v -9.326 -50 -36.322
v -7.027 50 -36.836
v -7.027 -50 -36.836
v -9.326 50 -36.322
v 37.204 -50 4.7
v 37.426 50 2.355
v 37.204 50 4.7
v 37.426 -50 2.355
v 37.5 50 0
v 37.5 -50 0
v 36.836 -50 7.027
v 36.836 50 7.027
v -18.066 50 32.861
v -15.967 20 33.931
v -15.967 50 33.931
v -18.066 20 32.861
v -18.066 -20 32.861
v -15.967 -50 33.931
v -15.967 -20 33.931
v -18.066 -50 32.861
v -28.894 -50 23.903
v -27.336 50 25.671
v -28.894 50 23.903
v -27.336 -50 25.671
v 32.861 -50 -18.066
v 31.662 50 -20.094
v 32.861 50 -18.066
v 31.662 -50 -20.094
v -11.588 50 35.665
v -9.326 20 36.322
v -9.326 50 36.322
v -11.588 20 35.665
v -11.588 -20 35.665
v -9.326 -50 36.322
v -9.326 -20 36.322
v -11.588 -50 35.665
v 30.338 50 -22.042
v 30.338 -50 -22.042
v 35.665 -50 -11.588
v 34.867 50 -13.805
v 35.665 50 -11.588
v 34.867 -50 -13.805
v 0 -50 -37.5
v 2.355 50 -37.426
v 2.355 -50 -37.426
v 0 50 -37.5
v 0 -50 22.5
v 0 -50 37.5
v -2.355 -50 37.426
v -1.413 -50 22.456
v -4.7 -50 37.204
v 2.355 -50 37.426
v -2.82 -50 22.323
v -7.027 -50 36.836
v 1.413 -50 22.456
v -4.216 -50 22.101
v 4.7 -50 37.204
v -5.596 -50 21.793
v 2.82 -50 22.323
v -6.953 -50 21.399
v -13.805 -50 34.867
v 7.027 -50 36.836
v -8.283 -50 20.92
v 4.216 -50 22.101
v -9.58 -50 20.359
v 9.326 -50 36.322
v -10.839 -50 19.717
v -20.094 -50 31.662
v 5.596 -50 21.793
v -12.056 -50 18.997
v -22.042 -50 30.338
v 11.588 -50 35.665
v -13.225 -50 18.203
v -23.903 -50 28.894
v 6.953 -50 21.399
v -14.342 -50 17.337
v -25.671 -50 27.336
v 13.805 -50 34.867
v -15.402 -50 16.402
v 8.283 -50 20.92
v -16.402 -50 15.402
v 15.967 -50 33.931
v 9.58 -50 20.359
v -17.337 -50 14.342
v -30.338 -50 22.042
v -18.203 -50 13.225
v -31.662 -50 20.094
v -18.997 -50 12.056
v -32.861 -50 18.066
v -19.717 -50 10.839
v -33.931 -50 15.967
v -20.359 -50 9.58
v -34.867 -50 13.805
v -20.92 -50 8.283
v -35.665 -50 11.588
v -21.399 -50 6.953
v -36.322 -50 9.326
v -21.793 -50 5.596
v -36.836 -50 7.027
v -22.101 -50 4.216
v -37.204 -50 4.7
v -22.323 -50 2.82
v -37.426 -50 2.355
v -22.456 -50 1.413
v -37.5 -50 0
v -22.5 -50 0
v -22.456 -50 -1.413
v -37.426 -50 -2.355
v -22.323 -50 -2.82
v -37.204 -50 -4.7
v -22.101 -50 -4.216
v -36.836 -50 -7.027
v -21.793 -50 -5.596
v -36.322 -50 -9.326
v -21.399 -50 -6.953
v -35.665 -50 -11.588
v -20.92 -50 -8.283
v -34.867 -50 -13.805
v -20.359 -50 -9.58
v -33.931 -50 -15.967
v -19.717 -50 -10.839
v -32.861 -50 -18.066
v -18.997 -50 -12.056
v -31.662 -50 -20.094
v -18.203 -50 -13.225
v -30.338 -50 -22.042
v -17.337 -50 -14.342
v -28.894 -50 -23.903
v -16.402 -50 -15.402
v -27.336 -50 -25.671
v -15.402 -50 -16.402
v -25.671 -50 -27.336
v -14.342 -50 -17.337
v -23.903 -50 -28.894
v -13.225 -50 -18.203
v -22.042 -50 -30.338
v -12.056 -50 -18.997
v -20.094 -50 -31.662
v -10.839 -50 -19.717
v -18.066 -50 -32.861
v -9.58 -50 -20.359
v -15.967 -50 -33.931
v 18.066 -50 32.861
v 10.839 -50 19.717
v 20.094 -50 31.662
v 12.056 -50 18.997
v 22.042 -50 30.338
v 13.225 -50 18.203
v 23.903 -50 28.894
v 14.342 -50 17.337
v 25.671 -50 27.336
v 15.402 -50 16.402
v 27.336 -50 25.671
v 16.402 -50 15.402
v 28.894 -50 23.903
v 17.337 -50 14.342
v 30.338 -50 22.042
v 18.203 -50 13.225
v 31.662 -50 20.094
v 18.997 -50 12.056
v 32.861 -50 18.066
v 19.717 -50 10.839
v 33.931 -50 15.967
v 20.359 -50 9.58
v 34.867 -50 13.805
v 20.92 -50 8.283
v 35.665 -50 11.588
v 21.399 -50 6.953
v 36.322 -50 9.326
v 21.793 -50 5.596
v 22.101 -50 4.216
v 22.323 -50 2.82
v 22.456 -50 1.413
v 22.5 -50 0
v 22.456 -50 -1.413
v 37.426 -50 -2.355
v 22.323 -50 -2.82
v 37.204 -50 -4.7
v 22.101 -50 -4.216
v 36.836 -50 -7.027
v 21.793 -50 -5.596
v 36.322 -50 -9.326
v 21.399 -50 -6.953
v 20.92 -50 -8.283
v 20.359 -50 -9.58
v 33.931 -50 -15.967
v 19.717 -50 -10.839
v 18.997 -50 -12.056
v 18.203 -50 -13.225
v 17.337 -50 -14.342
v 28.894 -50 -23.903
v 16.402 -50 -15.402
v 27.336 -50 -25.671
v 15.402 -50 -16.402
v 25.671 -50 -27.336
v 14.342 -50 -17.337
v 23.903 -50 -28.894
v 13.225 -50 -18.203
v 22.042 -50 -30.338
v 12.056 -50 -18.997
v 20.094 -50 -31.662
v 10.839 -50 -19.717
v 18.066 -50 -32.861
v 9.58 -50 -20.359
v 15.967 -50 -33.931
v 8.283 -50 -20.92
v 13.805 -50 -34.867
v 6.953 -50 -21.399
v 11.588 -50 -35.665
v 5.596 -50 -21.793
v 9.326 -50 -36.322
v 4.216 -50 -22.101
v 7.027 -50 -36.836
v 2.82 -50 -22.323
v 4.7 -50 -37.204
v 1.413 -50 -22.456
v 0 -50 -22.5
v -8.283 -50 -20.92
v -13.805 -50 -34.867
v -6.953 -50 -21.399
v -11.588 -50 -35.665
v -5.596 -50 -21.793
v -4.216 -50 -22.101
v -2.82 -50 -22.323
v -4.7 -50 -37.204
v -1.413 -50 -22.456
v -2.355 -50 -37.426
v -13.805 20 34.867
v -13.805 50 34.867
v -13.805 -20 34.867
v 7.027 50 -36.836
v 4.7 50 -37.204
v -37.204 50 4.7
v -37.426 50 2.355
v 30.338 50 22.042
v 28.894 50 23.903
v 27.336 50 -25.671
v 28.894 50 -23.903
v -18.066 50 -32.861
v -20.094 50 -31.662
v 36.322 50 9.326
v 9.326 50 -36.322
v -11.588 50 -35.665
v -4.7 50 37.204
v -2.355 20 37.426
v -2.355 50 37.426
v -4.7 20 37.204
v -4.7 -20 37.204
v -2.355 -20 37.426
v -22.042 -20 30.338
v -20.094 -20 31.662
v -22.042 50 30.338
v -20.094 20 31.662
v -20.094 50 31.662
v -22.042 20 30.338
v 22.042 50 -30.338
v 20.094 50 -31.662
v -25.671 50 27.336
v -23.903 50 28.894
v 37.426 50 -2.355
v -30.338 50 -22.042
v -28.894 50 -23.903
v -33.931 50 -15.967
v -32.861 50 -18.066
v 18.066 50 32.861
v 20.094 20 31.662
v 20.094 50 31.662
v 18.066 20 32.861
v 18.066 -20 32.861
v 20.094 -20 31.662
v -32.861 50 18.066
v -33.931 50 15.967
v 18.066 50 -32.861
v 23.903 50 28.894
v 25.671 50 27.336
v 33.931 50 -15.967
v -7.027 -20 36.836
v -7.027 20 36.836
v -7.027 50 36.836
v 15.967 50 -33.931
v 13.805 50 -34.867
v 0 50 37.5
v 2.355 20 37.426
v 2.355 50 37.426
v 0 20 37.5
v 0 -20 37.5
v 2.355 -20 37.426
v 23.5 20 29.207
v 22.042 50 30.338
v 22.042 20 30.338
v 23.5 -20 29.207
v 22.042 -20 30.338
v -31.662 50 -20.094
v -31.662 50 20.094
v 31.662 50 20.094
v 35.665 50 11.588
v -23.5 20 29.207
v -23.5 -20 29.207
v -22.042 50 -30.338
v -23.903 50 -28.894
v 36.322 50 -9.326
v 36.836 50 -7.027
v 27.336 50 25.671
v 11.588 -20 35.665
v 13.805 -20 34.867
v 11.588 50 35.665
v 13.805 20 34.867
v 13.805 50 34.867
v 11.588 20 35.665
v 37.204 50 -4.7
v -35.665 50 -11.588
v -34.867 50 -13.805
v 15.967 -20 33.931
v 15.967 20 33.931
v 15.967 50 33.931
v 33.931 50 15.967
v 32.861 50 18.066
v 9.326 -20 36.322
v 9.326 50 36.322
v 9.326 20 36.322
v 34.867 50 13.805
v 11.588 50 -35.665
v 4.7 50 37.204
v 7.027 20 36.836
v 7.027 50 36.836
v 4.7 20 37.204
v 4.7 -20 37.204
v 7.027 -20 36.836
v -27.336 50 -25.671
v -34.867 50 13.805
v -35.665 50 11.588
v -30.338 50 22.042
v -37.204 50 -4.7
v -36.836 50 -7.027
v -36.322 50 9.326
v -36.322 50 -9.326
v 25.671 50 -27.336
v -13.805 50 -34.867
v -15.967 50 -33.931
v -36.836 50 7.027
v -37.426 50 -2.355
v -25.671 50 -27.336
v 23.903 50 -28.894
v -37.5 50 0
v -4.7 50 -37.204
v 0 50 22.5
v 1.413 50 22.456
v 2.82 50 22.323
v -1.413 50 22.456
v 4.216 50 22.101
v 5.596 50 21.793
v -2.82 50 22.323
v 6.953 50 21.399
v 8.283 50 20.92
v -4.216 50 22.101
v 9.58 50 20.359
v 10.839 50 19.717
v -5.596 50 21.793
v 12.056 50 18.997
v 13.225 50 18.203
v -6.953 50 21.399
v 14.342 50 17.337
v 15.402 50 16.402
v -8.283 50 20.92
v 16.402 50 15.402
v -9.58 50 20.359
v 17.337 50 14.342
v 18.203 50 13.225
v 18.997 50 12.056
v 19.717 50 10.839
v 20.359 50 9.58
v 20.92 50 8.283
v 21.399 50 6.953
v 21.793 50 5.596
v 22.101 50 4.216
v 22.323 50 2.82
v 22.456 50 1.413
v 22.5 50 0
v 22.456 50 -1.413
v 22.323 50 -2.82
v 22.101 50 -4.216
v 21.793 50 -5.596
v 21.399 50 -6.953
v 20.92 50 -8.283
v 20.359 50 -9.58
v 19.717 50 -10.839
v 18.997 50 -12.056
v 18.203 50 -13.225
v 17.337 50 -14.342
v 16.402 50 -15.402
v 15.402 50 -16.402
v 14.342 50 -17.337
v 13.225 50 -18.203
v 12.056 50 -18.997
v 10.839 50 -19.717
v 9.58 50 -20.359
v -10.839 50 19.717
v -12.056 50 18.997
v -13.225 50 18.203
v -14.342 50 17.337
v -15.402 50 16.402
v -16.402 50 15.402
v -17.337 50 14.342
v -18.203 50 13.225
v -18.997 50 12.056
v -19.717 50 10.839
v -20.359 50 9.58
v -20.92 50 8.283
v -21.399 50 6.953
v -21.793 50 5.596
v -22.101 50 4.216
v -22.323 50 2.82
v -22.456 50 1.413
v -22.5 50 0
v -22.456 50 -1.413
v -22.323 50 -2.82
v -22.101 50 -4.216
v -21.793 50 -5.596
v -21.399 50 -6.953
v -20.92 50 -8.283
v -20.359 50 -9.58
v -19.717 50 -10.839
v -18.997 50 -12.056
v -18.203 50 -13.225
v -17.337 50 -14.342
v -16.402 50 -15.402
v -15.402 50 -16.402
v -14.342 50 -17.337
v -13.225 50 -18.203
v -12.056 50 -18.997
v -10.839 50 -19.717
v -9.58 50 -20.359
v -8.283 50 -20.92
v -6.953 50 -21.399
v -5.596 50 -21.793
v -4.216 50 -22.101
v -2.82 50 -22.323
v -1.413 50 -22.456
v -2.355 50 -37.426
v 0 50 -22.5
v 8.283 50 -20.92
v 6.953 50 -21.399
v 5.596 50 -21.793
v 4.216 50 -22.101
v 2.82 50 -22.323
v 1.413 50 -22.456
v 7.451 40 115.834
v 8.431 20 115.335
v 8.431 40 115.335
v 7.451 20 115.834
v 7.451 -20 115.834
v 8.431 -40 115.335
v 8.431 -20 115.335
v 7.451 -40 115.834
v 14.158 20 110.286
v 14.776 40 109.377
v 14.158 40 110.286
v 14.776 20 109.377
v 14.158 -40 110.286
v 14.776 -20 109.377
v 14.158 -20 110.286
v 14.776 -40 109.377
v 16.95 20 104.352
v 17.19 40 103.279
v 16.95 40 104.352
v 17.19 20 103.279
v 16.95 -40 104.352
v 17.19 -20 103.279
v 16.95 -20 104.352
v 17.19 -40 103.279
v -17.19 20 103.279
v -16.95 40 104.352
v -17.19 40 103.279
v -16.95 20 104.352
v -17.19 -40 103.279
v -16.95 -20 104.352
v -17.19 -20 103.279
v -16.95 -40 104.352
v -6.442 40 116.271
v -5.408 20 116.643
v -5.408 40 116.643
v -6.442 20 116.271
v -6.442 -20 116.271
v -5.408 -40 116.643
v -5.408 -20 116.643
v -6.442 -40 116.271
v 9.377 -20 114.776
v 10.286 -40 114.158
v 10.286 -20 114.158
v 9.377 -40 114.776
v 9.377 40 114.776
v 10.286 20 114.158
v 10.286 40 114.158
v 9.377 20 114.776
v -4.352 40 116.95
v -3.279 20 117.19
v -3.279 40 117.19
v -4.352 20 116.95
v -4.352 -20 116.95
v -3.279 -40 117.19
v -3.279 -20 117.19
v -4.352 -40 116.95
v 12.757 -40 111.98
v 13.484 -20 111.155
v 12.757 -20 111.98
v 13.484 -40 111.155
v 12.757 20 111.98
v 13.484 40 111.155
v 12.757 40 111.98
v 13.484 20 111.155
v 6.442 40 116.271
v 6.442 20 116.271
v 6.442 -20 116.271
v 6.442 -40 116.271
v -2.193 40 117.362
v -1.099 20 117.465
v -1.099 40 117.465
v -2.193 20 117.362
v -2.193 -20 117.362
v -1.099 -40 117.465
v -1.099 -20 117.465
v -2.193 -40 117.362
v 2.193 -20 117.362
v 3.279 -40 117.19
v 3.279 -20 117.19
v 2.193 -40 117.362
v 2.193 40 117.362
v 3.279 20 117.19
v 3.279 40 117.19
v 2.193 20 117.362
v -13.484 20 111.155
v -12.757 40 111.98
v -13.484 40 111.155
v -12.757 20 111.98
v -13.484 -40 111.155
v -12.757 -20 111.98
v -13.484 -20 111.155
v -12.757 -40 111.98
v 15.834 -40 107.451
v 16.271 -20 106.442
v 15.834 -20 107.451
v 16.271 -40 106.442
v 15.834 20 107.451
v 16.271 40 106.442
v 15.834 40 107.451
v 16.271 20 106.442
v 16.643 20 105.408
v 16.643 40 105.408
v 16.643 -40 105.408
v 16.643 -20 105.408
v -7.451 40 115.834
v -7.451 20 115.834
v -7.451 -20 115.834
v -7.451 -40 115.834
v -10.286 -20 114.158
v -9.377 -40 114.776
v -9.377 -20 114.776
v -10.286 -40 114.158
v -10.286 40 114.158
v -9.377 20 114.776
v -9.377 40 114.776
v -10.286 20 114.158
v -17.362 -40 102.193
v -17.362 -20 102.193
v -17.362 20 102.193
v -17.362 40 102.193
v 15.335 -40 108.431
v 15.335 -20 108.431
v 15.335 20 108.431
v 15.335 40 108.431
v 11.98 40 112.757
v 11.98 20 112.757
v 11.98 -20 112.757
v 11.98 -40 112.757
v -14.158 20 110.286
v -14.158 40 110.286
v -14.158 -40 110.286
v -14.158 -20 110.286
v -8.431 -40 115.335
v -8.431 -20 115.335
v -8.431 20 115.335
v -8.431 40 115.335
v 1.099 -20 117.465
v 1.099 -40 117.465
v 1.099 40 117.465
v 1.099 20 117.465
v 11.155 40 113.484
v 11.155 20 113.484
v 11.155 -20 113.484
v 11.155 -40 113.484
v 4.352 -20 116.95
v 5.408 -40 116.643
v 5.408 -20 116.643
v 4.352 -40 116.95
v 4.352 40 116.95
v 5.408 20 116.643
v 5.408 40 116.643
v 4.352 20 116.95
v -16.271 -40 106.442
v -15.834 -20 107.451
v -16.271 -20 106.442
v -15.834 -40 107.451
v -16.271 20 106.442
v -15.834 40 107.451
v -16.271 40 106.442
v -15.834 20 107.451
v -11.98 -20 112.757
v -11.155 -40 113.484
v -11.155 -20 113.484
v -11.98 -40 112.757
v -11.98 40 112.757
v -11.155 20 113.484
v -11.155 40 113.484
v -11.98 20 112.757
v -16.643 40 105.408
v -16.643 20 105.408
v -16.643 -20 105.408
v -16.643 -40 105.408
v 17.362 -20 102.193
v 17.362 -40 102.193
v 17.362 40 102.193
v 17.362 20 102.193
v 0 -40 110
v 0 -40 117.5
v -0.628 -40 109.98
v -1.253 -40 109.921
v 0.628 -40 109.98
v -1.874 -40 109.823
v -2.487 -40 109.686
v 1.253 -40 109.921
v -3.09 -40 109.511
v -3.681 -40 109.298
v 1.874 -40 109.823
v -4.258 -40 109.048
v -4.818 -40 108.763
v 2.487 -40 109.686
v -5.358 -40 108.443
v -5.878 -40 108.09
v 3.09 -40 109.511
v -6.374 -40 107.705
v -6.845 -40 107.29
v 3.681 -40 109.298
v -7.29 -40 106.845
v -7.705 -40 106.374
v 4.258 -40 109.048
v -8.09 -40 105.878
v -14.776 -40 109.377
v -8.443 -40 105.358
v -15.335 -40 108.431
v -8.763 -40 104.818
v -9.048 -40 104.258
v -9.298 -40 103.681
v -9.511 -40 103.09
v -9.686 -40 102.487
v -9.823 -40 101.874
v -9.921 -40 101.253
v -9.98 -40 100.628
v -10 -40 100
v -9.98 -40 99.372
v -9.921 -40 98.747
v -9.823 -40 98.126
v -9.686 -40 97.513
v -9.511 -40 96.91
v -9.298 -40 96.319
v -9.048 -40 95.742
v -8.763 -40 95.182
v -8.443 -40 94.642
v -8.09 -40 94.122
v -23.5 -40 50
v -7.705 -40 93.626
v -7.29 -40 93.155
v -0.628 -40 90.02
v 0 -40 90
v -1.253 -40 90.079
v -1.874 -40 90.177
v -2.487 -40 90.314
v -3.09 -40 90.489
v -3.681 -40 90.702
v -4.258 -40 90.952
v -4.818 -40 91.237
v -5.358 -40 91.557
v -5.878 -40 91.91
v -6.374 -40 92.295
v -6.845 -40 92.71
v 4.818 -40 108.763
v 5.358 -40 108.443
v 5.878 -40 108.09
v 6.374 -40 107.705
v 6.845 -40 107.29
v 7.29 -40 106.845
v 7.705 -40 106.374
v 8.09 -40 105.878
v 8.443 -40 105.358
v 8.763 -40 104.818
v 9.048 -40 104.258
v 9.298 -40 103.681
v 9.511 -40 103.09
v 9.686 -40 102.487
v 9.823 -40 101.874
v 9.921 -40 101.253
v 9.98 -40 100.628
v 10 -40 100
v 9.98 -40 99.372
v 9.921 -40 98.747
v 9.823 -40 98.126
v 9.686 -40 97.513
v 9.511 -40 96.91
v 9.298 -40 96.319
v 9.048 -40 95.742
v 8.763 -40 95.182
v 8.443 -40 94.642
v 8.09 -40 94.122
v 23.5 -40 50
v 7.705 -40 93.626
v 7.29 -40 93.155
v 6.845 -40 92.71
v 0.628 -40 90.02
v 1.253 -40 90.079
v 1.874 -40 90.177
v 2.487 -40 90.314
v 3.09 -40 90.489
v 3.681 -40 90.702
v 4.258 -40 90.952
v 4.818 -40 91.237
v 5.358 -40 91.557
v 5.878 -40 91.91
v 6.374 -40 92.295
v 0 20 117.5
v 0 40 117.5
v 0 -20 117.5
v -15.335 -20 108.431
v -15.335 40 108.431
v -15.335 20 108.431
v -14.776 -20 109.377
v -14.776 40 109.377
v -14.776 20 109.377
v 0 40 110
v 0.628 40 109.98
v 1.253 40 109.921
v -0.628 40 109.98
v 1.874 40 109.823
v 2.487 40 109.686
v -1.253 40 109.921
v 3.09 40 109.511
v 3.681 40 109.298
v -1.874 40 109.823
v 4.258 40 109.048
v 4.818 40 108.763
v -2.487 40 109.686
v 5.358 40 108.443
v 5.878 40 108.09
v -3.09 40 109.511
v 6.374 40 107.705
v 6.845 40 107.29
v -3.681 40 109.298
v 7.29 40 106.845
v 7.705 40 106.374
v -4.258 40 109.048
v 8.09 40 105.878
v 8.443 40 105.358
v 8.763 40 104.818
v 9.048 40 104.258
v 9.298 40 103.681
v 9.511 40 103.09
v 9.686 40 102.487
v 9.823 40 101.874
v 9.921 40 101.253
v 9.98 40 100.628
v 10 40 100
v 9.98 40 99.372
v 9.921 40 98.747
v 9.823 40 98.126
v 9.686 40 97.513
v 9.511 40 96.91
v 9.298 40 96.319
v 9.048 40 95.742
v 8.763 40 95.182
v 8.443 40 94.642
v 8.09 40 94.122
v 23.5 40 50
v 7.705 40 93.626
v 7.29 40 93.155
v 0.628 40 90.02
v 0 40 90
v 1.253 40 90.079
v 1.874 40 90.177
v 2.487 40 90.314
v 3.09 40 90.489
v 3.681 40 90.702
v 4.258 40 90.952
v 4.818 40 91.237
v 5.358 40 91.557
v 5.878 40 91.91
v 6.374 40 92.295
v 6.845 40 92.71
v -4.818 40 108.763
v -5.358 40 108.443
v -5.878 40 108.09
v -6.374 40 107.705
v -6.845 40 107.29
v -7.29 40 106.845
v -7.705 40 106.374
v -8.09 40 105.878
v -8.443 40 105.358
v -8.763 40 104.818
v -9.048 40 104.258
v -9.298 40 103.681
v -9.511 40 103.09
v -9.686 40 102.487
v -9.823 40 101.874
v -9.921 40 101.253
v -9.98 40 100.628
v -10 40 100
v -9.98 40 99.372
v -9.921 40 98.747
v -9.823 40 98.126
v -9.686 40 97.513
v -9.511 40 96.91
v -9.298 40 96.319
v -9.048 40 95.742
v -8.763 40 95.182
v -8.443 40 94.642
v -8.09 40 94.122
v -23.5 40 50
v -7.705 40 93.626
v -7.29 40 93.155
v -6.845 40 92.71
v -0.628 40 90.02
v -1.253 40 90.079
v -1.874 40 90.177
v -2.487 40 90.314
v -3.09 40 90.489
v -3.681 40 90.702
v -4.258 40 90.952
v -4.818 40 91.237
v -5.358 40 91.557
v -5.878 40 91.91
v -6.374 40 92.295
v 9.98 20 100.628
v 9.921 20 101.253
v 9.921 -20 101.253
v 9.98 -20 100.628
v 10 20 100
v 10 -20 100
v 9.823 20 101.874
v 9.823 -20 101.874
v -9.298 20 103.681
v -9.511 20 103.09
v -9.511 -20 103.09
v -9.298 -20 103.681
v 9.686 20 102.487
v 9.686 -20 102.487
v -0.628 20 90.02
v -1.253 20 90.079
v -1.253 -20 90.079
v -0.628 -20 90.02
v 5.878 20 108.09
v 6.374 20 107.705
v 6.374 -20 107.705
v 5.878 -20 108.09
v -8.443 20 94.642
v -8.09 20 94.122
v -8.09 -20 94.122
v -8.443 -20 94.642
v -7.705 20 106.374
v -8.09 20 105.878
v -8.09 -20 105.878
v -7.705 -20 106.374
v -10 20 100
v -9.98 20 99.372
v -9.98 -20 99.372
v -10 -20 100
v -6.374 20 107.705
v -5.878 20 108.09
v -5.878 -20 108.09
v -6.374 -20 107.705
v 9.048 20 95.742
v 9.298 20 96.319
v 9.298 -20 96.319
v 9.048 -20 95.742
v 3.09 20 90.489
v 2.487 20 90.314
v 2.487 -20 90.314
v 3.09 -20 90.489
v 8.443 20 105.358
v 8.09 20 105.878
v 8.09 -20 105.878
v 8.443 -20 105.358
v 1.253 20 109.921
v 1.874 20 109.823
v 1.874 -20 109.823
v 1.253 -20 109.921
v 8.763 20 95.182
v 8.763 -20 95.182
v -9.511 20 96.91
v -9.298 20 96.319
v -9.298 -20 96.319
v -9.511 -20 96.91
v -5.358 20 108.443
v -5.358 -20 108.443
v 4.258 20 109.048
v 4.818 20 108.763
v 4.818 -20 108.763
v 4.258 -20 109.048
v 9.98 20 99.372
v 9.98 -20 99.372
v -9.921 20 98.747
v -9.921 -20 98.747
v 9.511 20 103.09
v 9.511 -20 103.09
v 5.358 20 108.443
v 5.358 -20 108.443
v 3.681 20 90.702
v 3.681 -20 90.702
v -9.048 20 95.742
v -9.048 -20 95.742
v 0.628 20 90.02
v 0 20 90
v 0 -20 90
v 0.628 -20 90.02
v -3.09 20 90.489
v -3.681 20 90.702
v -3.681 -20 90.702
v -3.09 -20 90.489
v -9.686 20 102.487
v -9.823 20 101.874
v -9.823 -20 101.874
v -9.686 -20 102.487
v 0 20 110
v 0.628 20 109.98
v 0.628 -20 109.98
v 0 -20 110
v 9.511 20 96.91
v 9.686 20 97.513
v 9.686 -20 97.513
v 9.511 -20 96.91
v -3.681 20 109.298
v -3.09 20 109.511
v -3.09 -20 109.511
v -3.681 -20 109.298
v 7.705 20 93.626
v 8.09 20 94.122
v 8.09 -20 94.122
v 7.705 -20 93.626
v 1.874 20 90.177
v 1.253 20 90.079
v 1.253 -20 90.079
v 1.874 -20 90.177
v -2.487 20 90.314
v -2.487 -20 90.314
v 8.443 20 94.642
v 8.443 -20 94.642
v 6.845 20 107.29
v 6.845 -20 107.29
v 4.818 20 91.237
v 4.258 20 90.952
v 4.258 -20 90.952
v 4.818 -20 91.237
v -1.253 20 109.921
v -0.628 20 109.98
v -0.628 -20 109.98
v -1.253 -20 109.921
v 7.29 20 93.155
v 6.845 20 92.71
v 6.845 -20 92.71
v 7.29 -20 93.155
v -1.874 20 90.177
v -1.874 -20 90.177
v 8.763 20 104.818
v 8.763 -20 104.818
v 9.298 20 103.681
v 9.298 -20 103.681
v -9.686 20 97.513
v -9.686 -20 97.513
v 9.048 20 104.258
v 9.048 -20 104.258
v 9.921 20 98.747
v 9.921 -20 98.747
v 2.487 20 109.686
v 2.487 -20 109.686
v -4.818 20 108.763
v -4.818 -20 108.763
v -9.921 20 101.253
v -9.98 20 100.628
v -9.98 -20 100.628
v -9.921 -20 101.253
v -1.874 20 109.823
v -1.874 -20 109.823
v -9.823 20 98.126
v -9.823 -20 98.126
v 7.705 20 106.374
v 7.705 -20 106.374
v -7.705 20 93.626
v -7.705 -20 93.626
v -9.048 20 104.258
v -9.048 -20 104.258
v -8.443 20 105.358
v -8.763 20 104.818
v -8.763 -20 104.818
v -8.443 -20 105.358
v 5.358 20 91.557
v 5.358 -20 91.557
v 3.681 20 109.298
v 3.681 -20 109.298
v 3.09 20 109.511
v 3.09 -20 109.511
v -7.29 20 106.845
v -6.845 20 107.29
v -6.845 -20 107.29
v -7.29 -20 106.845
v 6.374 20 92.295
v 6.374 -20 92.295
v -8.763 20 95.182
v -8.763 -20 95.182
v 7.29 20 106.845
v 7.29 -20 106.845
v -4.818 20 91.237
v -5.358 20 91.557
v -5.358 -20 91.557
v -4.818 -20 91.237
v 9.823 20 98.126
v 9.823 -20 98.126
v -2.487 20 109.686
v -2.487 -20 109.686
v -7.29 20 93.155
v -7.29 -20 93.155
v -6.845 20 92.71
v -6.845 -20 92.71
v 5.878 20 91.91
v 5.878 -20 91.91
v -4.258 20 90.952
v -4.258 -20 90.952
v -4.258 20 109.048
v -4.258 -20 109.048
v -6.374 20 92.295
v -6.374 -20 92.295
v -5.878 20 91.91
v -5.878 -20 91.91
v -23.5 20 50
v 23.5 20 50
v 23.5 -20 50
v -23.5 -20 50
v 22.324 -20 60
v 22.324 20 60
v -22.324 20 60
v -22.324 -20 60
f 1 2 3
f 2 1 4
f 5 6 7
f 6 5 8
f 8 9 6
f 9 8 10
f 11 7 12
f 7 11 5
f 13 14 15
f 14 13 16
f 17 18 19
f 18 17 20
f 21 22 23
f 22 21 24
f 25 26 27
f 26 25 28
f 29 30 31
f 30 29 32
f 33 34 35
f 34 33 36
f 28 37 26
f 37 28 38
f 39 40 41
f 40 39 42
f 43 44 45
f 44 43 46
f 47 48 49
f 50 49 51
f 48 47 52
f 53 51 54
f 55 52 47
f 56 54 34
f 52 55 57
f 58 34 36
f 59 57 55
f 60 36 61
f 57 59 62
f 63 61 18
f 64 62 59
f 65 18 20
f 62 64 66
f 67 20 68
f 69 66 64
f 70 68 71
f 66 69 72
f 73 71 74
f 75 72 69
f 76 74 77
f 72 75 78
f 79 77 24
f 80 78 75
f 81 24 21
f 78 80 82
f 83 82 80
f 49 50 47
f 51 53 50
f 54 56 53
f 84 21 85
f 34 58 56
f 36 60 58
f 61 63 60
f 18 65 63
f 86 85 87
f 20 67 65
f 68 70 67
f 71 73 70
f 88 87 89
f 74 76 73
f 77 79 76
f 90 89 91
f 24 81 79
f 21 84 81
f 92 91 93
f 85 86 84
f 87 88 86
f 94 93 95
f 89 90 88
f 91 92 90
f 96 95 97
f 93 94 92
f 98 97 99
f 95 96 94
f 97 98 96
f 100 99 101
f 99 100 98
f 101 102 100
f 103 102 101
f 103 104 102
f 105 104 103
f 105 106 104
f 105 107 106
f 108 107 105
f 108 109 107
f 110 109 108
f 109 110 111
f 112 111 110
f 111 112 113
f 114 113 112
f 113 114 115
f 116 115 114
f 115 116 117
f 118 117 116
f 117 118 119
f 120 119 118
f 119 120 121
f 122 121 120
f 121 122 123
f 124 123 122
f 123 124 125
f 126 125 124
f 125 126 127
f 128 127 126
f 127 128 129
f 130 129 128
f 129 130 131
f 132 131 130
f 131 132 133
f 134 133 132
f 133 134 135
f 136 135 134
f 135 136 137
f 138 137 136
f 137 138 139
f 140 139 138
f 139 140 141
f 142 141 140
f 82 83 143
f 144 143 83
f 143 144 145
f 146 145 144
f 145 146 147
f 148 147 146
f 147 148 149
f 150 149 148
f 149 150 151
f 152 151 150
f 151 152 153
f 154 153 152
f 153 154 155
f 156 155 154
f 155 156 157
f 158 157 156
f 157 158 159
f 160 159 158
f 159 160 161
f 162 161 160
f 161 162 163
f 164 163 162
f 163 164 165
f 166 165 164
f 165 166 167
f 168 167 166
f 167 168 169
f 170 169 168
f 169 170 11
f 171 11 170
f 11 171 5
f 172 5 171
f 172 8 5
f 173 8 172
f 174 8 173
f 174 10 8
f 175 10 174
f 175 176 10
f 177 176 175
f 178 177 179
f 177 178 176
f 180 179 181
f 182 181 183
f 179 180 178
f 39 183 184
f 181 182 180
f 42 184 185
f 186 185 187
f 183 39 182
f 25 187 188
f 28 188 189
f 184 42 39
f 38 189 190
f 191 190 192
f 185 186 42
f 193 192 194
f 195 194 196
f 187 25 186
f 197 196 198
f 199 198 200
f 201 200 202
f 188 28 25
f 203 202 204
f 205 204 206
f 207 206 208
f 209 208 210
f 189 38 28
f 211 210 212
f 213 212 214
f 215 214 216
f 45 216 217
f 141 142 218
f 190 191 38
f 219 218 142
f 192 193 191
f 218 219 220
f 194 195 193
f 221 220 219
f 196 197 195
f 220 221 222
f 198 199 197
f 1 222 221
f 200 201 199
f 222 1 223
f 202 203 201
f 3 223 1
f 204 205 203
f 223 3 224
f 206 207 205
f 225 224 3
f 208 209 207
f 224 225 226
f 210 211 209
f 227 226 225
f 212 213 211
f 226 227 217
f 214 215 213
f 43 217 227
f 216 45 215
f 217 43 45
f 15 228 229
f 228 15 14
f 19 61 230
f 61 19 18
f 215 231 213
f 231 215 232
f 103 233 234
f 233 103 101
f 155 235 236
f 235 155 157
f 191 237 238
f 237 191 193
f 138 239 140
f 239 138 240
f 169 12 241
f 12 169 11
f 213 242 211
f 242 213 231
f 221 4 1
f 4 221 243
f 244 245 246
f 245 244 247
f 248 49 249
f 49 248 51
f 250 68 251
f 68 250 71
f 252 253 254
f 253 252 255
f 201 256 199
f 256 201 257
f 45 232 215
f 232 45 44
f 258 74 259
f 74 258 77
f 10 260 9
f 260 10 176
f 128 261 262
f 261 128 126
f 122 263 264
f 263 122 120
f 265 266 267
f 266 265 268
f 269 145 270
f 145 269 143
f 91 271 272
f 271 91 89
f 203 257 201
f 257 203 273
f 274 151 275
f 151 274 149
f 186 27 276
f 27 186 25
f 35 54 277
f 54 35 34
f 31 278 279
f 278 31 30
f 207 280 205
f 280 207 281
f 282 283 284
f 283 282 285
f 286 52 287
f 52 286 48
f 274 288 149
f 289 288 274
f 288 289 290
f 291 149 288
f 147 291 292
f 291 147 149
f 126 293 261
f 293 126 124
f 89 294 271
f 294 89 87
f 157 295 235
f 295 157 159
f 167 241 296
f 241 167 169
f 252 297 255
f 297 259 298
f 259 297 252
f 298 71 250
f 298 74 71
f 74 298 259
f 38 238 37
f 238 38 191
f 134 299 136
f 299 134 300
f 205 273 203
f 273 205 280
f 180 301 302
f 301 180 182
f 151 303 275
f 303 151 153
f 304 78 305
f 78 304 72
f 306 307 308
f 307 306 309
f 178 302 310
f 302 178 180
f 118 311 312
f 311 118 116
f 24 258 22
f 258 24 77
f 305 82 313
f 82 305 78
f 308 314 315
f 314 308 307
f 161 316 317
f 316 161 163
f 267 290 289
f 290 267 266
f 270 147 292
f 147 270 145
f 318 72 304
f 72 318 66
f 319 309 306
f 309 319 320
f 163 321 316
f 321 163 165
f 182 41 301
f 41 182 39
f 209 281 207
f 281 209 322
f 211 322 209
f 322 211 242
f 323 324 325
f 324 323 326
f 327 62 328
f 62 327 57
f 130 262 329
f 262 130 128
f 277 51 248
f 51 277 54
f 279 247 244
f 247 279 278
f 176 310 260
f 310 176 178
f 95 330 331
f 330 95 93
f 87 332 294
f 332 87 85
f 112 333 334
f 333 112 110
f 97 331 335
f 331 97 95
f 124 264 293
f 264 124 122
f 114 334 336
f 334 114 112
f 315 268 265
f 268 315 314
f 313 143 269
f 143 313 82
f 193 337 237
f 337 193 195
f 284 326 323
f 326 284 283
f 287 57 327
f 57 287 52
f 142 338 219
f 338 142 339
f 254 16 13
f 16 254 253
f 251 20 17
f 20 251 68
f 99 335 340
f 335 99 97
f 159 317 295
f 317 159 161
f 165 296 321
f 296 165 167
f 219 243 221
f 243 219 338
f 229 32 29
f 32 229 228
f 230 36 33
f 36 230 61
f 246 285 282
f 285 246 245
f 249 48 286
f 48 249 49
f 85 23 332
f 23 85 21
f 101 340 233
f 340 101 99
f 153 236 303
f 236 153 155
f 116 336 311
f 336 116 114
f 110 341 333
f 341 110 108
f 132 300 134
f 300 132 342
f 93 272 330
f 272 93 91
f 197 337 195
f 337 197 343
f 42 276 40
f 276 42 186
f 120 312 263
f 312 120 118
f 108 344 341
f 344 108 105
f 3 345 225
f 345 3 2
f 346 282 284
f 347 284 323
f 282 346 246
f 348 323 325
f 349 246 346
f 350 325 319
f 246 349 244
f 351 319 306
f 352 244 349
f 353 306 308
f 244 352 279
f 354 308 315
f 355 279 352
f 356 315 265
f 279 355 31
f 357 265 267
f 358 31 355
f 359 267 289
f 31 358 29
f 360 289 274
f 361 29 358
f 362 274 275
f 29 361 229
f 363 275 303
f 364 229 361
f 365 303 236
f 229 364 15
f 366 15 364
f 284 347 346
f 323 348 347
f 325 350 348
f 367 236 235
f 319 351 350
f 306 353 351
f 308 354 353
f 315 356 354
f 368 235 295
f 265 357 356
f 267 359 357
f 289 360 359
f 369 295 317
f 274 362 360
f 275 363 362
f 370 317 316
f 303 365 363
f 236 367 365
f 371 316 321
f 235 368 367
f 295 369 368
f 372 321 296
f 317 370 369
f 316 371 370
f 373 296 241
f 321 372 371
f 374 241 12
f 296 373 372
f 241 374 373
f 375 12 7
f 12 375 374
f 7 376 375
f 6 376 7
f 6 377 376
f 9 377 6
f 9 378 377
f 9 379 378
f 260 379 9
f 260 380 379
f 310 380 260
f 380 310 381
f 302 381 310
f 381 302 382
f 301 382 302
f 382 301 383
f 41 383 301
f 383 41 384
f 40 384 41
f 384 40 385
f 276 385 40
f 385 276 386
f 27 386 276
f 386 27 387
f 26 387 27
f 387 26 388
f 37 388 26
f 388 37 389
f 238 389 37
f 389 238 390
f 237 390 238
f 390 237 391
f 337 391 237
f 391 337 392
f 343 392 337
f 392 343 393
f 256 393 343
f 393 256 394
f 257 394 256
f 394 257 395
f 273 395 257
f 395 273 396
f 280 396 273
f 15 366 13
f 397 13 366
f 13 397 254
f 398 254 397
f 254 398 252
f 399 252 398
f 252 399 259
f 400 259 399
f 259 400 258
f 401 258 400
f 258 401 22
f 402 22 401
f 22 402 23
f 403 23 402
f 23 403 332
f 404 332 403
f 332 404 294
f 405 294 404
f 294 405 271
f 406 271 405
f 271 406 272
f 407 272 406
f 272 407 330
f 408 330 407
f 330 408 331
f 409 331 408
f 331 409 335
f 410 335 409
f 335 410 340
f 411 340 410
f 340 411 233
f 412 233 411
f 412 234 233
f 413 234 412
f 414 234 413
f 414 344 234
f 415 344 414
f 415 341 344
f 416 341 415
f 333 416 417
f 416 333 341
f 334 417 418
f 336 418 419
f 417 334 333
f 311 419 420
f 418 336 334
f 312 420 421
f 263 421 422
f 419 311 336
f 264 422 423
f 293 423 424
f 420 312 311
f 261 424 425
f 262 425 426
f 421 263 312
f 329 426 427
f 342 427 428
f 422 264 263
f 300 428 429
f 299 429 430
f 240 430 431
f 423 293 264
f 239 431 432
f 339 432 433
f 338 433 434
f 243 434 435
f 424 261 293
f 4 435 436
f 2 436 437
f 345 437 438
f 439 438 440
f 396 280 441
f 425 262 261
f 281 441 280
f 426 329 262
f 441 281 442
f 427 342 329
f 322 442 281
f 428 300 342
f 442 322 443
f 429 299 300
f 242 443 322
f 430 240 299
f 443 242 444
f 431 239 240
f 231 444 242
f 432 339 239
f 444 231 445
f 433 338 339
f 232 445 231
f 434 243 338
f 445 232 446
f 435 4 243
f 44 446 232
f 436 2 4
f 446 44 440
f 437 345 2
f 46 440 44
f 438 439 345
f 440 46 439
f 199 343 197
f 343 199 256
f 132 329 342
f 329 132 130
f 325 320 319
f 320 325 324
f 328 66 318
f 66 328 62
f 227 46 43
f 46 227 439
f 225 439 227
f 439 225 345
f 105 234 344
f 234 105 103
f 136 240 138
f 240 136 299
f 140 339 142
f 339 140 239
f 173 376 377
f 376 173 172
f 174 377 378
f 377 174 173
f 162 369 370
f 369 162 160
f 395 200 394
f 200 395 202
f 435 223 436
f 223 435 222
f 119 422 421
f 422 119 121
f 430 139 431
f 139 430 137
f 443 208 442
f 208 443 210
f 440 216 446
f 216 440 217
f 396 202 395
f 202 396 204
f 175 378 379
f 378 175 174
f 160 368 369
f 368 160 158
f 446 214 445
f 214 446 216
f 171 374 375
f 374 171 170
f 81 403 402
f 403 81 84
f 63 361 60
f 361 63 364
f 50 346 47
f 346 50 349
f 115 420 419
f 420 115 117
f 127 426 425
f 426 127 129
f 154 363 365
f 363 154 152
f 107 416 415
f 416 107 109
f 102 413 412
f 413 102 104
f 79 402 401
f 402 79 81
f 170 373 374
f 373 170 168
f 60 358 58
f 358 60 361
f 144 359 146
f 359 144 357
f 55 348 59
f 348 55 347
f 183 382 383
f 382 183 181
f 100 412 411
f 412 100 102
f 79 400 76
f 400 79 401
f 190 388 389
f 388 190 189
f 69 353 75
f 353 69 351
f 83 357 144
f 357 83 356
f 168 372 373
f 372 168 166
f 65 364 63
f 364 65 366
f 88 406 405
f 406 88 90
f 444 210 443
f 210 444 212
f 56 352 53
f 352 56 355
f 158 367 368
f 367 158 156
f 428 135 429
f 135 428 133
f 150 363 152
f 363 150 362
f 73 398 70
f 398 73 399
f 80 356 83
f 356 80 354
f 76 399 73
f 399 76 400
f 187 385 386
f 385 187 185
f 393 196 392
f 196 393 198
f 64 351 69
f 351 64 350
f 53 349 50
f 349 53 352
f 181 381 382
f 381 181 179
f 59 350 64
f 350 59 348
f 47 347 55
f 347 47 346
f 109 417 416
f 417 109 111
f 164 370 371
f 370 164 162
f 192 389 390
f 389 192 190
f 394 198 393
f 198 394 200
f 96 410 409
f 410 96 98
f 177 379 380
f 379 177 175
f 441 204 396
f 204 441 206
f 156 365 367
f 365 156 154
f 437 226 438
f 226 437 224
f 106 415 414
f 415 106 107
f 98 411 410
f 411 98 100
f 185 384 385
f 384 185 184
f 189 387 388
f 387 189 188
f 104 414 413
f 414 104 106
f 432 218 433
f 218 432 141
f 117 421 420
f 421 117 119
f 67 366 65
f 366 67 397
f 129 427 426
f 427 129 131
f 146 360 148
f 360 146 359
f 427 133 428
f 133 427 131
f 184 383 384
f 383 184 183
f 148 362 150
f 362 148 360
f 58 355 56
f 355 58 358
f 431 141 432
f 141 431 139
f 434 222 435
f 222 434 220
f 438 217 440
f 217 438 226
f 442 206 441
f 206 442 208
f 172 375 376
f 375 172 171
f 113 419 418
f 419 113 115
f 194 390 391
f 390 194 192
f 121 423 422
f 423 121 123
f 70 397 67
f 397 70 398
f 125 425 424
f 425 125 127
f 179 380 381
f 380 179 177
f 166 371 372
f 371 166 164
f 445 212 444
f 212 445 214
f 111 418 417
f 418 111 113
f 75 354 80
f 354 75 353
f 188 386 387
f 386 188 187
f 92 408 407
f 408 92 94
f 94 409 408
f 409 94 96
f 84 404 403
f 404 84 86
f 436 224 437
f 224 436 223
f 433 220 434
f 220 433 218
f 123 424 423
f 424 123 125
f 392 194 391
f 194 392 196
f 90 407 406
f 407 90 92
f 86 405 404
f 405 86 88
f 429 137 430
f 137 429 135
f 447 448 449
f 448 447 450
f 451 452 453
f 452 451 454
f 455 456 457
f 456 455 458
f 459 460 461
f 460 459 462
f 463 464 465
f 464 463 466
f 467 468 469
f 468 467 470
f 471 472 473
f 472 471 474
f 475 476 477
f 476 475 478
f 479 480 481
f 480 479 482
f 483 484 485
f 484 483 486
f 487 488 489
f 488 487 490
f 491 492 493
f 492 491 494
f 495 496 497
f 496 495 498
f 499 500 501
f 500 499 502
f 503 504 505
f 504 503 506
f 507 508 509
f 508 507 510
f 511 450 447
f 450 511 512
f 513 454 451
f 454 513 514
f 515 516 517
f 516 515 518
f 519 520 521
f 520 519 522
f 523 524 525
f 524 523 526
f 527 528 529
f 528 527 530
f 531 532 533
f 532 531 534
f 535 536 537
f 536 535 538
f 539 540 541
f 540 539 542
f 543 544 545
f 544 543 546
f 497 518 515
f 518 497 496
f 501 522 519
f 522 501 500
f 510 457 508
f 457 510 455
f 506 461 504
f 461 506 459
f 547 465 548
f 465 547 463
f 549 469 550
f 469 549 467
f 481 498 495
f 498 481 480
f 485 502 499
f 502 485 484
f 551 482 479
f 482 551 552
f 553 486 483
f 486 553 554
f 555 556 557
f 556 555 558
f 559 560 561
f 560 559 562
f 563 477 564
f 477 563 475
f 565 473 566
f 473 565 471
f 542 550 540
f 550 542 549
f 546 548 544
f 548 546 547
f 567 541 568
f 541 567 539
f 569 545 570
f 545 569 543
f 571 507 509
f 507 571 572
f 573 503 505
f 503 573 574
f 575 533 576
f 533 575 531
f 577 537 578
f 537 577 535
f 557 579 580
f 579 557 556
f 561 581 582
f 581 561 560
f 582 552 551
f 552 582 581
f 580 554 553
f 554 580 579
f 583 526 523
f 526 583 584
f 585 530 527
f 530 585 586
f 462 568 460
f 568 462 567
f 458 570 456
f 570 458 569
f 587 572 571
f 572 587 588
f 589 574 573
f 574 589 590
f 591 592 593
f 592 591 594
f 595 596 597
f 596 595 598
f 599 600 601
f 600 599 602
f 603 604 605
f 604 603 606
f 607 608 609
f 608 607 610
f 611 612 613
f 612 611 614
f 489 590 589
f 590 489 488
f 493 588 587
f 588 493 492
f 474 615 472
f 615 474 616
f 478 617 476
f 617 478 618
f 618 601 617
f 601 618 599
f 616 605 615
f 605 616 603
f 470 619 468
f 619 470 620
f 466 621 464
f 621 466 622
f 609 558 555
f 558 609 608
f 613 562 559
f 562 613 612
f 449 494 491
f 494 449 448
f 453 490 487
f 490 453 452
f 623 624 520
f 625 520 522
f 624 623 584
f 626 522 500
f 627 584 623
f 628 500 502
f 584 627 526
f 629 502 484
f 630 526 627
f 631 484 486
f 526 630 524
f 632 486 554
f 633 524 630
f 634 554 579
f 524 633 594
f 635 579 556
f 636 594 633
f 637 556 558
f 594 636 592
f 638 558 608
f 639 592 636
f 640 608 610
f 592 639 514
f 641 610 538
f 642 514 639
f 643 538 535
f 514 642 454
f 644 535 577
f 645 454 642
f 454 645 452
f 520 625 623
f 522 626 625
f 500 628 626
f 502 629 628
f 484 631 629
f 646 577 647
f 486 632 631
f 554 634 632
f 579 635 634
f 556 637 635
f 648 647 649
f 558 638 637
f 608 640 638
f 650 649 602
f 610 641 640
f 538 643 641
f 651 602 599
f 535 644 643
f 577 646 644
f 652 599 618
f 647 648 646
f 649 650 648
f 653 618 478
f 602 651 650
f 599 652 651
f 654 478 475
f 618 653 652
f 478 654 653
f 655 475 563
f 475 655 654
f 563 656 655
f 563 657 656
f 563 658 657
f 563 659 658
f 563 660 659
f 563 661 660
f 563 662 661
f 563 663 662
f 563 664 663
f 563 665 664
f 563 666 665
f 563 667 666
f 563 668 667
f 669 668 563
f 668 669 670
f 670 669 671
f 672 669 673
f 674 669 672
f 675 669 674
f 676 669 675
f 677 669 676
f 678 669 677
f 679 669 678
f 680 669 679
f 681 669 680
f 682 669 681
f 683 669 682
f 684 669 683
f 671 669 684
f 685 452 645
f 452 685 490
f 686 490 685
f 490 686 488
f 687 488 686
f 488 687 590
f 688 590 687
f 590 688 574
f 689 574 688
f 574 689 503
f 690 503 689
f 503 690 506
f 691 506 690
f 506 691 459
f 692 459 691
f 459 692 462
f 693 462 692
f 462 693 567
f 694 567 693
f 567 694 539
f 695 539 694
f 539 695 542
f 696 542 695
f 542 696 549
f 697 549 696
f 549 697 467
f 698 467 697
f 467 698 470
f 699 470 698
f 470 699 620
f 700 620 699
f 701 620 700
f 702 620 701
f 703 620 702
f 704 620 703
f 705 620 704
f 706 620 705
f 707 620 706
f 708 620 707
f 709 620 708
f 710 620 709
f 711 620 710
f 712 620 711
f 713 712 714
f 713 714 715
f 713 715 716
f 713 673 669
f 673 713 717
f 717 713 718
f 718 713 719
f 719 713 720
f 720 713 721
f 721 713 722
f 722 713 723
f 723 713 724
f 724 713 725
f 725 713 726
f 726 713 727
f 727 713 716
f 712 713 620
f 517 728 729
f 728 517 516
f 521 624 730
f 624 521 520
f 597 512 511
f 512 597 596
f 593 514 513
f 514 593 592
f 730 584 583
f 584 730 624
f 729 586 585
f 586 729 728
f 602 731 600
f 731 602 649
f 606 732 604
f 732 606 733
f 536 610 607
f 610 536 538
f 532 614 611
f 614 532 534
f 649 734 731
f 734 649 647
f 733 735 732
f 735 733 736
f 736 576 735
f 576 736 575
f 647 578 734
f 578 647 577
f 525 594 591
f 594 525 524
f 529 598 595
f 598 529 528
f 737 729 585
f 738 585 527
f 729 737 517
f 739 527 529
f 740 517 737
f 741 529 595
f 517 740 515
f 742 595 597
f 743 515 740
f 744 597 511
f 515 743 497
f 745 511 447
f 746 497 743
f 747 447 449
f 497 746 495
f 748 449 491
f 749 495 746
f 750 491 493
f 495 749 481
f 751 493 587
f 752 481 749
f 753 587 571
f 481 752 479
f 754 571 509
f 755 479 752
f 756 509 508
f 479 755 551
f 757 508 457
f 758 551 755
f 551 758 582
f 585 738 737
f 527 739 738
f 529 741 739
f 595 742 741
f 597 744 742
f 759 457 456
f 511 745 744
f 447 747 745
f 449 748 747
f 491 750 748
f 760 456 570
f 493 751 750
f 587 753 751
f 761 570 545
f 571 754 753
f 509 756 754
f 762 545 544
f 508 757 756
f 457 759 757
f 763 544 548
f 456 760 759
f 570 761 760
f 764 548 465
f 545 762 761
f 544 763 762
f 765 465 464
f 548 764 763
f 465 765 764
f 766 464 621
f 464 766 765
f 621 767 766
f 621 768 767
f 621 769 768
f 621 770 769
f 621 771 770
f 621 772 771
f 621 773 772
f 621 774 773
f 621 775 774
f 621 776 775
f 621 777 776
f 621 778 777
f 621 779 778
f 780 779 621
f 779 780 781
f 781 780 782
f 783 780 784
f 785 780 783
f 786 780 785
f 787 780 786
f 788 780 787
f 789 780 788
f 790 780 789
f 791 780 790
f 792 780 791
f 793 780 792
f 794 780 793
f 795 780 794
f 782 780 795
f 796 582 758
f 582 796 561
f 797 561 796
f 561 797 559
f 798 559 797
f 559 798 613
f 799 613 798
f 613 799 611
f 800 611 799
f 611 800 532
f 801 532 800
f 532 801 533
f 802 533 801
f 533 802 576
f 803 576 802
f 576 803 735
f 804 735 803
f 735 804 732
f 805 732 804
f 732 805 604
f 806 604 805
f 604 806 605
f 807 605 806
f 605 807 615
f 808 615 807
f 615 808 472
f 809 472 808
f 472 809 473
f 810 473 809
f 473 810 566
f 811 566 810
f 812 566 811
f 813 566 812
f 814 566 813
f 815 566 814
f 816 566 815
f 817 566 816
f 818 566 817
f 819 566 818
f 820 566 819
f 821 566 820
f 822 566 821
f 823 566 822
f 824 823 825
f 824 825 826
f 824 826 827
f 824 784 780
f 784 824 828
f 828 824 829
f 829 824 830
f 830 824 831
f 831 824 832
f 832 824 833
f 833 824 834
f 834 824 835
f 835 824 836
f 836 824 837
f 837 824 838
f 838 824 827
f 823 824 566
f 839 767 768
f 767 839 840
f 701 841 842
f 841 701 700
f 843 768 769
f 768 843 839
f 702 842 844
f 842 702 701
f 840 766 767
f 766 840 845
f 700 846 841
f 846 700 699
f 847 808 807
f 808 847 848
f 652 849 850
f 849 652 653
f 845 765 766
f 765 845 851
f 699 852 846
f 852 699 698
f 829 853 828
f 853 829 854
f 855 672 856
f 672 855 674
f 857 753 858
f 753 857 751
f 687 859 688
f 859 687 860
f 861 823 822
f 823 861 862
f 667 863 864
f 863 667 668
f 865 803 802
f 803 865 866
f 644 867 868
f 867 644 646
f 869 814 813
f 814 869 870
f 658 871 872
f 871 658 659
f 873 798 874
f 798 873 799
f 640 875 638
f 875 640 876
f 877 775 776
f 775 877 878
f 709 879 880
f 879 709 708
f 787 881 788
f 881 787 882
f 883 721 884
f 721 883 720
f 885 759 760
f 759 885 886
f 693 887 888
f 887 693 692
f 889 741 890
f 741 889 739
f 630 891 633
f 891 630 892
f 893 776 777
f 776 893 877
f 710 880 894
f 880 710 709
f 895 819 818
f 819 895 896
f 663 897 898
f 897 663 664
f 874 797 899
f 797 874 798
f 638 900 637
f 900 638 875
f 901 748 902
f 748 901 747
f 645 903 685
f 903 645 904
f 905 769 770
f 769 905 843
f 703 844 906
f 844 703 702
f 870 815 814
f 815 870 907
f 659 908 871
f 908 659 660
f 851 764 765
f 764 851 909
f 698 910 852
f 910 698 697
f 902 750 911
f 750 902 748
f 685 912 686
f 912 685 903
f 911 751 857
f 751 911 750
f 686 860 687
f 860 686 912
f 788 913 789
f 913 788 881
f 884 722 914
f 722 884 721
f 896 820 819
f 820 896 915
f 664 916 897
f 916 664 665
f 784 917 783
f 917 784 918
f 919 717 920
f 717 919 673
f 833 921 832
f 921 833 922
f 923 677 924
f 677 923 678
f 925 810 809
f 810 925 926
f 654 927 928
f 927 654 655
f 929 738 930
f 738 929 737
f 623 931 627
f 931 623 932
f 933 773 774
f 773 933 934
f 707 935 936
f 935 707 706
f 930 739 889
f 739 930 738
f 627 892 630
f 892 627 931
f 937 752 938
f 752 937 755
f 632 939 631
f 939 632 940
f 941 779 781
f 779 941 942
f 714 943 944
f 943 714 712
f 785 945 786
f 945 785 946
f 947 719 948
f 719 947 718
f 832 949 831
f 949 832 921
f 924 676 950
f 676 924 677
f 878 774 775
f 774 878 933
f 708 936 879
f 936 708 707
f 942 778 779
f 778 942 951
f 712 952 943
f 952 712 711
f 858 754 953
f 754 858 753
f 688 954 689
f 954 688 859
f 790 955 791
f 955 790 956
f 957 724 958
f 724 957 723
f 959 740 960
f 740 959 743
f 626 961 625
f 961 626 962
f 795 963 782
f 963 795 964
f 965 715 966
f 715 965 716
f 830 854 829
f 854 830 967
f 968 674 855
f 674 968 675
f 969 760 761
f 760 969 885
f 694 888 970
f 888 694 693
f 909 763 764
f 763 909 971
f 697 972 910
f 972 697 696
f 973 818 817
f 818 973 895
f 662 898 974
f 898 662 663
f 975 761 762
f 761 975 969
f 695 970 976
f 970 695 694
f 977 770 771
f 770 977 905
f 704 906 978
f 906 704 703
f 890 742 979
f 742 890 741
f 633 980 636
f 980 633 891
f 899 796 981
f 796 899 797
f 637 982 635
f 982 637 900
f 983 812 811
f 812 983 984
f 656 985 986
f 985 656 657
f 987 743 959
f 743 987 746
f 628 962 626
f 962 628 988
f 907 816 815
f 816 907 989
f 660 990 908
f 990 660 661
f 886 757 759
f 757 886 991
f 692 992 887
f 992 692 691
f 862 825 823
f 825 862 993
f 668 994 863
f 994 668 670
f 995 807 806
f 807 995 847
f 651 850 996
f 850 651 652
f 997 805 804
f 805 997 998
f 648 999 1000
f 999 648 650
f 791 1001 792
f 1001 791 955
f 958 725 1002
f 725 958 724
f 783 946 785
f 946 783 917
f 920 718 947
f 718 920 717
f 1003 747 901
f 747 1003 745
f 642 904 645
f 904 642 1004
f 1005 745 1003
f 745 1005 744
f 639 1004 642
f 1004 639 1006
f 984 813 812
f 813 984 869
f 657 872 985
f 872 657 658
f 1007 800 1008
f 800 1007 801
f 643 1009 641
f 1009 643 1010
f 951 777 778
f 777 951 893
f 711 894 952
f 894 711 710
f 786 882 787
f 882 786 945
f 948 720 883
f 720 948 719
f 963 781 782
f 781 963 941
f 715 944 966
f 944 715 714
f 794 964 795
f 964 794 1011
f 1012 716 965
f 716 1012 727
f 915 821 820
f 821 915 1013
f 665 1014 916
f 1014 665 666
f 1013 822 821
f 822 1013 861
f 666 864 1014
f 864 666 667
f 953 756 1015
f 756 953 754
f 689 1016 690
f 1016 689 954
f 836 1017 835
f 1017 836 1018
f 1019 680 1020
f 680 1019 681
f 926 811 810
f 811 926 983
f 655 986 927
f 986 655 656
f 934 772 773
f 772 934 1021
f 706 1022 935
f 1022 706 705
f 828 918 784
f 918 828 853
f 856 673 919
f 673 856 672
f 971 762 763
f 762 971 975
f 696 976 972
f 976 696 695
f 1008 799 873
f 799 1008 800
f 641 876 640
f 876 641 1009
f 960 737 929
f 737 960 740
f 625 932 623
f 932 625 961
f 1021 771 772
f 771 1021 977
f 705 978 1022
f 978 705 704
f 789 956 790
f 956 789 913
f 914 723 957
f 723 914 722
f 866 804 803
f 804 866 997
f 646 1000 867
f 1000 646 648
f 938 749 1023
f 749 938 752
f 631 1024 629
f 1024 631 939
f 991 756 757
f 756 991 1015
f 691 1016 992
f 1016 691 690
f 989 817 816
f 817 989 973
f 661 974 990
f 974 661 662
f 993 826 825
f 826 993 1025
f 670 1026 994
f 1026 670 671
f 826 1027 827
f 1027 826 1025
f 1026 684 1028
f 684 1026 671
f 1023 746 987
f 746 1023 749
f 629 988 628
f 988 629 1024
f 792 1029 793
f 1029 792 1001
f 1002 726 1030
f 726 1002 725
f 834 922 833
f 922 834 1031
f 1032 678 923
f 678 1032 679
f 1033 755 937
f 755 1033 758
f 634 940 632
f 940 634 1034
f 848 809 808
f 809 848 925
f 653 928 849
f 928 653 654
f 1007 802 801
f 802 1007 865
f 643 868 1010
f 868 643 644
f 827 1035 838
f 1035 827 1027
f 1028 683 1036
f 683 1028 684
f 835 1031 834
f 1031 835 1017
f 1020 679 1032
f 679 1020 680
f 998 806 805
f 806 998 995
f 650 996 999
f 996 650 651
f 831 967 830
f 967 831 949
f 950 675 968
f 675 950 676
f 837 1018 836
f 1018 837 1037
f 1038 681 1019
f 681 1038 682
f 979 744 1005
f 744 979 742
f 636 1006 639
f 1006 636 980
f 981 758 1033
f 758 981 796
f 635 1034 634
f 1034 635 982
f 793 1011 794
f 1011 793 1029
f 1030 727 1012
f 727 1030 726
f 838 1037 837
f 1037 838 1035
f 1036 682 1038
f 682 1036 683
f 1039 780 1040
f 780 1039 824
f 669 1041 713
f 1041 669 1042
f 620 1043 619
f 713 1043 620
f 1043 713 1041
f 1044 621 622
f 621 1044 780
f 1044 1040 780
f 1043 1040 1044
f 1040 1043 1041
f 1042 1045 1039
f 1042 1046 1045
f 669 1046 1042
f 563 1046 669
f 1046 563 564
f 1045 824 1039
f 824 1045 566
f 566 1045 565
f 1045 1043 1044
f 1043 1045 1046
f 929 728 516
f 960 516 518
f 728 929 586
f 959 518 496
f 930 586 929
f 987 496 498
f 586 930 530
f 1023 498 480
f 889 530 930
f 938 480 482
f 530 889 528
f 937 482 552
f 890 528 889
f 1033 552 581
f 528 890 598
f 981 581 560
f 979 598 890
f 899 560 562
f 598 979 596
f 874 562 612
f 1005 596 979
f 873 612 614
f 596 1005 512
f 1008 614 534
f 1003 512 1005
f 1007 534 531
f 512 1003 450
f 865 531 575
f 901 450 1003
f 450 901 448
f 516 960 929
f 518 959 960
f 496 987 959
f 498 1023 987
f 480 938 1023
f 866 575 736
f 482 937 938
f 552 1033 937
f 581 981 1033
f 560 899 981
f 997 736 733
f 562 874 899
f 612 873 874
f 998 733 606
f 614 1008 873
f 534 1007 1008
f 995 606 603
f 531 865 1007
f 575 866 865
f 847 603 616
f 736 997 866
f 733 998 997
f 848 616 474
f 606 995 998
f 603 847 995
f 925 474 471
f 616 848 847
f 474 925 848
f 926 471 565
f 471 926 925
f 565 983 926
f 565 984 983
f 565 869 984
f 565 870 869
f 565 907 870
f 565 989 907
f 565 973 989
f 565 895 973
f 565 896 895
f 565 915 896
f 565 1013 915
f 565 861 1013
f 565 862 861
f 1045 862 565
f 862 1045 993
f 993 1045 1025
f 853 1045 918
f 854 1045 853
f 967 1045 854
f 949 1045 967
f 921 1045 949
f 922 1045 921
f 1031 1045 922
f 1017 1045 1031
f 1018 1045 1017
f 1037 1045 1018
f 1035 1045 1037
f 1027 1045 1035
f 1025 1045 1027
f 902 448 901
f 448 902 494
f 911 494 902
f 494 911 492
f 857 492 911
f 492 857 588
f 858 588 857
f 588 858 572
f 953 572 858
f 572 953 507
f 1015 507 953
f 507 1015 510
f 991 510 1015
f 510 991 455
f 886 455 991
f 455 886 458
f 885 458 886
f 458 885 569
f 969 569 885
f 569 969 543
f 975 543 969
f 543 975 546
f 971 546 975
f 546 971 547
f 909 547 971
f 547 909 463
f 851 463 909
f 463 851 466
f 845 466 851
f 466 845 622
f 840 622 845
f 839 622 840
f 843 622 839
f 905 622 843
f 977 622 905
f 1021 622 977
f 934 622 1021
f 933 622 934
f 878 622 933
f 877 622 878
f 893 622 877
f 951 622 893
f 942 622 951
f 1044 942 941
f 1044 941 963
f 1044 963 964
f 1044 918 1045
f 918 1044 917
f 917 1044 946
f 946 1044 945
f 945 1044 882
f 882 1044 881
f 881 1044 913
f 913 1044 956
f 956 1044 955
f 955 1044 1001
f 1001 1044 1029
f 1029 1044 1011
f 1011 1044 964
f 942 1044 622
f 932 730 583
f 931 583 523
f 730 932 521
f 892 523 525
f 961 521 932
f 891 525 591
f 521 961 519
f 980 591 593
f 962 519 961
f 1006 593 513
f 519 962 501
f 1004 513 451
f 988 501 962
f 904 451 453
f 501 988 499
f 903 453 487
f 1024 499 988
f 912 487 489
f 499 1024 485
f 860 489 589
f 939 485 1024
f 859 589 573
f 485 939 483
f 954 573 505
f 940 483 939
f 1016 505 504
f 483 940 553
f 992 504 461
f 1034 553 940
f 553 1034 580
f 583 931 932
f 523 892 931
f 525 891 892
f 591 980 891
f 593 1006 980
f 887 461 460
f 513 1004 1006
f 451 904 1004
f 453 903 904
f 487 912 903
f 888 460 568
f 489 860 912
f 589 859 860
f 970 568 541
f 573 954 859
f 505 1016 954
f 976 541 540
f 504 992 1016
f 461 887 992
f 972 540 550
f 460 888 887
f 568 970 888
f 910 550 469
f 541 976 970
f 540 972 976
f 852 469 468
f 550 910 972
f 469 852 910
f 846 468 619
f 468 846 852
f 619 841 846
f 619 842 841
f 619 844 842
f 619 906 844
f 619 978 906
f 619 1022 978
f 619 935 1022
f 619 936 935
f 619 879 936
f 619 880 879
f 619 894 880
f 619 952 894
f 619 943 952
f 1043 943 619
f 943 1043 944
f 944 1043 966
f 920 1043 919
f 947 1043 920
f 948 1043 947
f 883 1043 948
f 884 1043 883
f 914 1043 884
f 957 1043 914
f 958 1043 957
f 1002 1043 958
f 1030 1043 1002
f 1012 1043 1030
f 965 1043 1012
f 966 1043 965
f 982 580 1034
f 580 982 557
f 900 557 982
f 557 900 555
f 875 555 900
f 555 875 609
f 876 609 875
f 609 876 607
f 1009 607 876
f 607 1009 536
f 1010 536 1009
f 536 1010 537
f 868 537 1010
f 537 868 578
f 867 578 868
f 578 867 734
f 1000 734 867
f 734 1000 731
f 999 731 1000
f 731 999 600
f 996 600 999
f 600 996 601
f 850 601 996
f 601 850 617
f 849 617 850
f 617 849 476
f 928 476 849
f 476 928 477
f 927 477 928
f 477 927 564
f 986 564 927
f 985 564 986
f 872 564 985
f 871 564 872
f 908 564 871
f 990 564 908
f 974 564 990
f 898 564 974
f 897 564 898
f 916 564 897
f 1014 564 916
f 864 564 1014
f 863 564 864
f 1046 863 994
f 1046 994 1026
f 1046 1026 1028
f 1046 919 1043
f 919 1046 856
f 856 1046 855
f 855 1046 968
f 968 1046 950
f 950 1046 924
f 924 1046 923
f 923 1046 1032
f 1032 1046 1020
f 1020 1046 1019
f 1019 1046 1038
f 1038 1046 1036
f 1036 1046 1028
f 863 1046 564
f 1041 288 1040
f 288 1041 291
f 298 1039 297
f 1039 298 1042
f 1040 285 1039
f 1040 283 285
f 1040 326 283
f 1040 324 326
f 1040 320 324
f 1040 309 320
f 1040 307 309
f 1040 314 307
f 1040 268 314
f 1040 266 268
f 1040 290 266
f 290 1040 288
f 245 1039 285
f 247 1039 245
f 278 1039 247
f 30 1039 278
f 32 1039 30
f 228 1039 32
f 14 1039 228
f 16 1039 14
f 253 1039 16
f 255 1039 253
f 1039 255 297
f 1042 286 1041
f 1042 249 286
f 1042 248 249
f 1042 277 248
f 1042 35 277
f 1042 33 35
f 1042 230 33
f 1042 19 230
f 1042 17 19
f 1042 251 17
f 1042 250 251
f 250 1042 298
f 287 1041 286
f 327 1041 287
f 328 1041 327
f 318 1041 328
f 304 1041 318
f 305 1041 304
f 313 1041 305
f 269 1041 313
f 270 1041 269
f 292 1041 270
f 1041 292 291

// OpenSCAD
$fn=100;
mm=1; // define units
degrees=1;

include <../lib.scad>

module example_132(){
  length=100;
  module body(){
    rotate(90*X){
      annulus(od=75,id=45,t=length,center=true);}}
  module facet(){
    afixment_width=40;
    length=80;
    width=47;
    module top(){
      difference(){
	outer_hull(){
	  translate(100*Z){
	    rotate(90*X){
	      annulus(od=35,id=20,t=length,center=true);}}
	  translate(50*Z){
	    xpair(0){
	      // Using a ramp here just for the point.
	      ramp(width/2,1,length,center=true);}}}
	translate(60*Z){
	  Cube([width/*overcut*/,40,60/*overcut*/],center=X+Y);}}}
    module base(){
      Cube([width,afixment_width,50],center=X+Y);}
    top();
    base();}
  outer_glue(){
    body();
    facet();}}

example_132();
